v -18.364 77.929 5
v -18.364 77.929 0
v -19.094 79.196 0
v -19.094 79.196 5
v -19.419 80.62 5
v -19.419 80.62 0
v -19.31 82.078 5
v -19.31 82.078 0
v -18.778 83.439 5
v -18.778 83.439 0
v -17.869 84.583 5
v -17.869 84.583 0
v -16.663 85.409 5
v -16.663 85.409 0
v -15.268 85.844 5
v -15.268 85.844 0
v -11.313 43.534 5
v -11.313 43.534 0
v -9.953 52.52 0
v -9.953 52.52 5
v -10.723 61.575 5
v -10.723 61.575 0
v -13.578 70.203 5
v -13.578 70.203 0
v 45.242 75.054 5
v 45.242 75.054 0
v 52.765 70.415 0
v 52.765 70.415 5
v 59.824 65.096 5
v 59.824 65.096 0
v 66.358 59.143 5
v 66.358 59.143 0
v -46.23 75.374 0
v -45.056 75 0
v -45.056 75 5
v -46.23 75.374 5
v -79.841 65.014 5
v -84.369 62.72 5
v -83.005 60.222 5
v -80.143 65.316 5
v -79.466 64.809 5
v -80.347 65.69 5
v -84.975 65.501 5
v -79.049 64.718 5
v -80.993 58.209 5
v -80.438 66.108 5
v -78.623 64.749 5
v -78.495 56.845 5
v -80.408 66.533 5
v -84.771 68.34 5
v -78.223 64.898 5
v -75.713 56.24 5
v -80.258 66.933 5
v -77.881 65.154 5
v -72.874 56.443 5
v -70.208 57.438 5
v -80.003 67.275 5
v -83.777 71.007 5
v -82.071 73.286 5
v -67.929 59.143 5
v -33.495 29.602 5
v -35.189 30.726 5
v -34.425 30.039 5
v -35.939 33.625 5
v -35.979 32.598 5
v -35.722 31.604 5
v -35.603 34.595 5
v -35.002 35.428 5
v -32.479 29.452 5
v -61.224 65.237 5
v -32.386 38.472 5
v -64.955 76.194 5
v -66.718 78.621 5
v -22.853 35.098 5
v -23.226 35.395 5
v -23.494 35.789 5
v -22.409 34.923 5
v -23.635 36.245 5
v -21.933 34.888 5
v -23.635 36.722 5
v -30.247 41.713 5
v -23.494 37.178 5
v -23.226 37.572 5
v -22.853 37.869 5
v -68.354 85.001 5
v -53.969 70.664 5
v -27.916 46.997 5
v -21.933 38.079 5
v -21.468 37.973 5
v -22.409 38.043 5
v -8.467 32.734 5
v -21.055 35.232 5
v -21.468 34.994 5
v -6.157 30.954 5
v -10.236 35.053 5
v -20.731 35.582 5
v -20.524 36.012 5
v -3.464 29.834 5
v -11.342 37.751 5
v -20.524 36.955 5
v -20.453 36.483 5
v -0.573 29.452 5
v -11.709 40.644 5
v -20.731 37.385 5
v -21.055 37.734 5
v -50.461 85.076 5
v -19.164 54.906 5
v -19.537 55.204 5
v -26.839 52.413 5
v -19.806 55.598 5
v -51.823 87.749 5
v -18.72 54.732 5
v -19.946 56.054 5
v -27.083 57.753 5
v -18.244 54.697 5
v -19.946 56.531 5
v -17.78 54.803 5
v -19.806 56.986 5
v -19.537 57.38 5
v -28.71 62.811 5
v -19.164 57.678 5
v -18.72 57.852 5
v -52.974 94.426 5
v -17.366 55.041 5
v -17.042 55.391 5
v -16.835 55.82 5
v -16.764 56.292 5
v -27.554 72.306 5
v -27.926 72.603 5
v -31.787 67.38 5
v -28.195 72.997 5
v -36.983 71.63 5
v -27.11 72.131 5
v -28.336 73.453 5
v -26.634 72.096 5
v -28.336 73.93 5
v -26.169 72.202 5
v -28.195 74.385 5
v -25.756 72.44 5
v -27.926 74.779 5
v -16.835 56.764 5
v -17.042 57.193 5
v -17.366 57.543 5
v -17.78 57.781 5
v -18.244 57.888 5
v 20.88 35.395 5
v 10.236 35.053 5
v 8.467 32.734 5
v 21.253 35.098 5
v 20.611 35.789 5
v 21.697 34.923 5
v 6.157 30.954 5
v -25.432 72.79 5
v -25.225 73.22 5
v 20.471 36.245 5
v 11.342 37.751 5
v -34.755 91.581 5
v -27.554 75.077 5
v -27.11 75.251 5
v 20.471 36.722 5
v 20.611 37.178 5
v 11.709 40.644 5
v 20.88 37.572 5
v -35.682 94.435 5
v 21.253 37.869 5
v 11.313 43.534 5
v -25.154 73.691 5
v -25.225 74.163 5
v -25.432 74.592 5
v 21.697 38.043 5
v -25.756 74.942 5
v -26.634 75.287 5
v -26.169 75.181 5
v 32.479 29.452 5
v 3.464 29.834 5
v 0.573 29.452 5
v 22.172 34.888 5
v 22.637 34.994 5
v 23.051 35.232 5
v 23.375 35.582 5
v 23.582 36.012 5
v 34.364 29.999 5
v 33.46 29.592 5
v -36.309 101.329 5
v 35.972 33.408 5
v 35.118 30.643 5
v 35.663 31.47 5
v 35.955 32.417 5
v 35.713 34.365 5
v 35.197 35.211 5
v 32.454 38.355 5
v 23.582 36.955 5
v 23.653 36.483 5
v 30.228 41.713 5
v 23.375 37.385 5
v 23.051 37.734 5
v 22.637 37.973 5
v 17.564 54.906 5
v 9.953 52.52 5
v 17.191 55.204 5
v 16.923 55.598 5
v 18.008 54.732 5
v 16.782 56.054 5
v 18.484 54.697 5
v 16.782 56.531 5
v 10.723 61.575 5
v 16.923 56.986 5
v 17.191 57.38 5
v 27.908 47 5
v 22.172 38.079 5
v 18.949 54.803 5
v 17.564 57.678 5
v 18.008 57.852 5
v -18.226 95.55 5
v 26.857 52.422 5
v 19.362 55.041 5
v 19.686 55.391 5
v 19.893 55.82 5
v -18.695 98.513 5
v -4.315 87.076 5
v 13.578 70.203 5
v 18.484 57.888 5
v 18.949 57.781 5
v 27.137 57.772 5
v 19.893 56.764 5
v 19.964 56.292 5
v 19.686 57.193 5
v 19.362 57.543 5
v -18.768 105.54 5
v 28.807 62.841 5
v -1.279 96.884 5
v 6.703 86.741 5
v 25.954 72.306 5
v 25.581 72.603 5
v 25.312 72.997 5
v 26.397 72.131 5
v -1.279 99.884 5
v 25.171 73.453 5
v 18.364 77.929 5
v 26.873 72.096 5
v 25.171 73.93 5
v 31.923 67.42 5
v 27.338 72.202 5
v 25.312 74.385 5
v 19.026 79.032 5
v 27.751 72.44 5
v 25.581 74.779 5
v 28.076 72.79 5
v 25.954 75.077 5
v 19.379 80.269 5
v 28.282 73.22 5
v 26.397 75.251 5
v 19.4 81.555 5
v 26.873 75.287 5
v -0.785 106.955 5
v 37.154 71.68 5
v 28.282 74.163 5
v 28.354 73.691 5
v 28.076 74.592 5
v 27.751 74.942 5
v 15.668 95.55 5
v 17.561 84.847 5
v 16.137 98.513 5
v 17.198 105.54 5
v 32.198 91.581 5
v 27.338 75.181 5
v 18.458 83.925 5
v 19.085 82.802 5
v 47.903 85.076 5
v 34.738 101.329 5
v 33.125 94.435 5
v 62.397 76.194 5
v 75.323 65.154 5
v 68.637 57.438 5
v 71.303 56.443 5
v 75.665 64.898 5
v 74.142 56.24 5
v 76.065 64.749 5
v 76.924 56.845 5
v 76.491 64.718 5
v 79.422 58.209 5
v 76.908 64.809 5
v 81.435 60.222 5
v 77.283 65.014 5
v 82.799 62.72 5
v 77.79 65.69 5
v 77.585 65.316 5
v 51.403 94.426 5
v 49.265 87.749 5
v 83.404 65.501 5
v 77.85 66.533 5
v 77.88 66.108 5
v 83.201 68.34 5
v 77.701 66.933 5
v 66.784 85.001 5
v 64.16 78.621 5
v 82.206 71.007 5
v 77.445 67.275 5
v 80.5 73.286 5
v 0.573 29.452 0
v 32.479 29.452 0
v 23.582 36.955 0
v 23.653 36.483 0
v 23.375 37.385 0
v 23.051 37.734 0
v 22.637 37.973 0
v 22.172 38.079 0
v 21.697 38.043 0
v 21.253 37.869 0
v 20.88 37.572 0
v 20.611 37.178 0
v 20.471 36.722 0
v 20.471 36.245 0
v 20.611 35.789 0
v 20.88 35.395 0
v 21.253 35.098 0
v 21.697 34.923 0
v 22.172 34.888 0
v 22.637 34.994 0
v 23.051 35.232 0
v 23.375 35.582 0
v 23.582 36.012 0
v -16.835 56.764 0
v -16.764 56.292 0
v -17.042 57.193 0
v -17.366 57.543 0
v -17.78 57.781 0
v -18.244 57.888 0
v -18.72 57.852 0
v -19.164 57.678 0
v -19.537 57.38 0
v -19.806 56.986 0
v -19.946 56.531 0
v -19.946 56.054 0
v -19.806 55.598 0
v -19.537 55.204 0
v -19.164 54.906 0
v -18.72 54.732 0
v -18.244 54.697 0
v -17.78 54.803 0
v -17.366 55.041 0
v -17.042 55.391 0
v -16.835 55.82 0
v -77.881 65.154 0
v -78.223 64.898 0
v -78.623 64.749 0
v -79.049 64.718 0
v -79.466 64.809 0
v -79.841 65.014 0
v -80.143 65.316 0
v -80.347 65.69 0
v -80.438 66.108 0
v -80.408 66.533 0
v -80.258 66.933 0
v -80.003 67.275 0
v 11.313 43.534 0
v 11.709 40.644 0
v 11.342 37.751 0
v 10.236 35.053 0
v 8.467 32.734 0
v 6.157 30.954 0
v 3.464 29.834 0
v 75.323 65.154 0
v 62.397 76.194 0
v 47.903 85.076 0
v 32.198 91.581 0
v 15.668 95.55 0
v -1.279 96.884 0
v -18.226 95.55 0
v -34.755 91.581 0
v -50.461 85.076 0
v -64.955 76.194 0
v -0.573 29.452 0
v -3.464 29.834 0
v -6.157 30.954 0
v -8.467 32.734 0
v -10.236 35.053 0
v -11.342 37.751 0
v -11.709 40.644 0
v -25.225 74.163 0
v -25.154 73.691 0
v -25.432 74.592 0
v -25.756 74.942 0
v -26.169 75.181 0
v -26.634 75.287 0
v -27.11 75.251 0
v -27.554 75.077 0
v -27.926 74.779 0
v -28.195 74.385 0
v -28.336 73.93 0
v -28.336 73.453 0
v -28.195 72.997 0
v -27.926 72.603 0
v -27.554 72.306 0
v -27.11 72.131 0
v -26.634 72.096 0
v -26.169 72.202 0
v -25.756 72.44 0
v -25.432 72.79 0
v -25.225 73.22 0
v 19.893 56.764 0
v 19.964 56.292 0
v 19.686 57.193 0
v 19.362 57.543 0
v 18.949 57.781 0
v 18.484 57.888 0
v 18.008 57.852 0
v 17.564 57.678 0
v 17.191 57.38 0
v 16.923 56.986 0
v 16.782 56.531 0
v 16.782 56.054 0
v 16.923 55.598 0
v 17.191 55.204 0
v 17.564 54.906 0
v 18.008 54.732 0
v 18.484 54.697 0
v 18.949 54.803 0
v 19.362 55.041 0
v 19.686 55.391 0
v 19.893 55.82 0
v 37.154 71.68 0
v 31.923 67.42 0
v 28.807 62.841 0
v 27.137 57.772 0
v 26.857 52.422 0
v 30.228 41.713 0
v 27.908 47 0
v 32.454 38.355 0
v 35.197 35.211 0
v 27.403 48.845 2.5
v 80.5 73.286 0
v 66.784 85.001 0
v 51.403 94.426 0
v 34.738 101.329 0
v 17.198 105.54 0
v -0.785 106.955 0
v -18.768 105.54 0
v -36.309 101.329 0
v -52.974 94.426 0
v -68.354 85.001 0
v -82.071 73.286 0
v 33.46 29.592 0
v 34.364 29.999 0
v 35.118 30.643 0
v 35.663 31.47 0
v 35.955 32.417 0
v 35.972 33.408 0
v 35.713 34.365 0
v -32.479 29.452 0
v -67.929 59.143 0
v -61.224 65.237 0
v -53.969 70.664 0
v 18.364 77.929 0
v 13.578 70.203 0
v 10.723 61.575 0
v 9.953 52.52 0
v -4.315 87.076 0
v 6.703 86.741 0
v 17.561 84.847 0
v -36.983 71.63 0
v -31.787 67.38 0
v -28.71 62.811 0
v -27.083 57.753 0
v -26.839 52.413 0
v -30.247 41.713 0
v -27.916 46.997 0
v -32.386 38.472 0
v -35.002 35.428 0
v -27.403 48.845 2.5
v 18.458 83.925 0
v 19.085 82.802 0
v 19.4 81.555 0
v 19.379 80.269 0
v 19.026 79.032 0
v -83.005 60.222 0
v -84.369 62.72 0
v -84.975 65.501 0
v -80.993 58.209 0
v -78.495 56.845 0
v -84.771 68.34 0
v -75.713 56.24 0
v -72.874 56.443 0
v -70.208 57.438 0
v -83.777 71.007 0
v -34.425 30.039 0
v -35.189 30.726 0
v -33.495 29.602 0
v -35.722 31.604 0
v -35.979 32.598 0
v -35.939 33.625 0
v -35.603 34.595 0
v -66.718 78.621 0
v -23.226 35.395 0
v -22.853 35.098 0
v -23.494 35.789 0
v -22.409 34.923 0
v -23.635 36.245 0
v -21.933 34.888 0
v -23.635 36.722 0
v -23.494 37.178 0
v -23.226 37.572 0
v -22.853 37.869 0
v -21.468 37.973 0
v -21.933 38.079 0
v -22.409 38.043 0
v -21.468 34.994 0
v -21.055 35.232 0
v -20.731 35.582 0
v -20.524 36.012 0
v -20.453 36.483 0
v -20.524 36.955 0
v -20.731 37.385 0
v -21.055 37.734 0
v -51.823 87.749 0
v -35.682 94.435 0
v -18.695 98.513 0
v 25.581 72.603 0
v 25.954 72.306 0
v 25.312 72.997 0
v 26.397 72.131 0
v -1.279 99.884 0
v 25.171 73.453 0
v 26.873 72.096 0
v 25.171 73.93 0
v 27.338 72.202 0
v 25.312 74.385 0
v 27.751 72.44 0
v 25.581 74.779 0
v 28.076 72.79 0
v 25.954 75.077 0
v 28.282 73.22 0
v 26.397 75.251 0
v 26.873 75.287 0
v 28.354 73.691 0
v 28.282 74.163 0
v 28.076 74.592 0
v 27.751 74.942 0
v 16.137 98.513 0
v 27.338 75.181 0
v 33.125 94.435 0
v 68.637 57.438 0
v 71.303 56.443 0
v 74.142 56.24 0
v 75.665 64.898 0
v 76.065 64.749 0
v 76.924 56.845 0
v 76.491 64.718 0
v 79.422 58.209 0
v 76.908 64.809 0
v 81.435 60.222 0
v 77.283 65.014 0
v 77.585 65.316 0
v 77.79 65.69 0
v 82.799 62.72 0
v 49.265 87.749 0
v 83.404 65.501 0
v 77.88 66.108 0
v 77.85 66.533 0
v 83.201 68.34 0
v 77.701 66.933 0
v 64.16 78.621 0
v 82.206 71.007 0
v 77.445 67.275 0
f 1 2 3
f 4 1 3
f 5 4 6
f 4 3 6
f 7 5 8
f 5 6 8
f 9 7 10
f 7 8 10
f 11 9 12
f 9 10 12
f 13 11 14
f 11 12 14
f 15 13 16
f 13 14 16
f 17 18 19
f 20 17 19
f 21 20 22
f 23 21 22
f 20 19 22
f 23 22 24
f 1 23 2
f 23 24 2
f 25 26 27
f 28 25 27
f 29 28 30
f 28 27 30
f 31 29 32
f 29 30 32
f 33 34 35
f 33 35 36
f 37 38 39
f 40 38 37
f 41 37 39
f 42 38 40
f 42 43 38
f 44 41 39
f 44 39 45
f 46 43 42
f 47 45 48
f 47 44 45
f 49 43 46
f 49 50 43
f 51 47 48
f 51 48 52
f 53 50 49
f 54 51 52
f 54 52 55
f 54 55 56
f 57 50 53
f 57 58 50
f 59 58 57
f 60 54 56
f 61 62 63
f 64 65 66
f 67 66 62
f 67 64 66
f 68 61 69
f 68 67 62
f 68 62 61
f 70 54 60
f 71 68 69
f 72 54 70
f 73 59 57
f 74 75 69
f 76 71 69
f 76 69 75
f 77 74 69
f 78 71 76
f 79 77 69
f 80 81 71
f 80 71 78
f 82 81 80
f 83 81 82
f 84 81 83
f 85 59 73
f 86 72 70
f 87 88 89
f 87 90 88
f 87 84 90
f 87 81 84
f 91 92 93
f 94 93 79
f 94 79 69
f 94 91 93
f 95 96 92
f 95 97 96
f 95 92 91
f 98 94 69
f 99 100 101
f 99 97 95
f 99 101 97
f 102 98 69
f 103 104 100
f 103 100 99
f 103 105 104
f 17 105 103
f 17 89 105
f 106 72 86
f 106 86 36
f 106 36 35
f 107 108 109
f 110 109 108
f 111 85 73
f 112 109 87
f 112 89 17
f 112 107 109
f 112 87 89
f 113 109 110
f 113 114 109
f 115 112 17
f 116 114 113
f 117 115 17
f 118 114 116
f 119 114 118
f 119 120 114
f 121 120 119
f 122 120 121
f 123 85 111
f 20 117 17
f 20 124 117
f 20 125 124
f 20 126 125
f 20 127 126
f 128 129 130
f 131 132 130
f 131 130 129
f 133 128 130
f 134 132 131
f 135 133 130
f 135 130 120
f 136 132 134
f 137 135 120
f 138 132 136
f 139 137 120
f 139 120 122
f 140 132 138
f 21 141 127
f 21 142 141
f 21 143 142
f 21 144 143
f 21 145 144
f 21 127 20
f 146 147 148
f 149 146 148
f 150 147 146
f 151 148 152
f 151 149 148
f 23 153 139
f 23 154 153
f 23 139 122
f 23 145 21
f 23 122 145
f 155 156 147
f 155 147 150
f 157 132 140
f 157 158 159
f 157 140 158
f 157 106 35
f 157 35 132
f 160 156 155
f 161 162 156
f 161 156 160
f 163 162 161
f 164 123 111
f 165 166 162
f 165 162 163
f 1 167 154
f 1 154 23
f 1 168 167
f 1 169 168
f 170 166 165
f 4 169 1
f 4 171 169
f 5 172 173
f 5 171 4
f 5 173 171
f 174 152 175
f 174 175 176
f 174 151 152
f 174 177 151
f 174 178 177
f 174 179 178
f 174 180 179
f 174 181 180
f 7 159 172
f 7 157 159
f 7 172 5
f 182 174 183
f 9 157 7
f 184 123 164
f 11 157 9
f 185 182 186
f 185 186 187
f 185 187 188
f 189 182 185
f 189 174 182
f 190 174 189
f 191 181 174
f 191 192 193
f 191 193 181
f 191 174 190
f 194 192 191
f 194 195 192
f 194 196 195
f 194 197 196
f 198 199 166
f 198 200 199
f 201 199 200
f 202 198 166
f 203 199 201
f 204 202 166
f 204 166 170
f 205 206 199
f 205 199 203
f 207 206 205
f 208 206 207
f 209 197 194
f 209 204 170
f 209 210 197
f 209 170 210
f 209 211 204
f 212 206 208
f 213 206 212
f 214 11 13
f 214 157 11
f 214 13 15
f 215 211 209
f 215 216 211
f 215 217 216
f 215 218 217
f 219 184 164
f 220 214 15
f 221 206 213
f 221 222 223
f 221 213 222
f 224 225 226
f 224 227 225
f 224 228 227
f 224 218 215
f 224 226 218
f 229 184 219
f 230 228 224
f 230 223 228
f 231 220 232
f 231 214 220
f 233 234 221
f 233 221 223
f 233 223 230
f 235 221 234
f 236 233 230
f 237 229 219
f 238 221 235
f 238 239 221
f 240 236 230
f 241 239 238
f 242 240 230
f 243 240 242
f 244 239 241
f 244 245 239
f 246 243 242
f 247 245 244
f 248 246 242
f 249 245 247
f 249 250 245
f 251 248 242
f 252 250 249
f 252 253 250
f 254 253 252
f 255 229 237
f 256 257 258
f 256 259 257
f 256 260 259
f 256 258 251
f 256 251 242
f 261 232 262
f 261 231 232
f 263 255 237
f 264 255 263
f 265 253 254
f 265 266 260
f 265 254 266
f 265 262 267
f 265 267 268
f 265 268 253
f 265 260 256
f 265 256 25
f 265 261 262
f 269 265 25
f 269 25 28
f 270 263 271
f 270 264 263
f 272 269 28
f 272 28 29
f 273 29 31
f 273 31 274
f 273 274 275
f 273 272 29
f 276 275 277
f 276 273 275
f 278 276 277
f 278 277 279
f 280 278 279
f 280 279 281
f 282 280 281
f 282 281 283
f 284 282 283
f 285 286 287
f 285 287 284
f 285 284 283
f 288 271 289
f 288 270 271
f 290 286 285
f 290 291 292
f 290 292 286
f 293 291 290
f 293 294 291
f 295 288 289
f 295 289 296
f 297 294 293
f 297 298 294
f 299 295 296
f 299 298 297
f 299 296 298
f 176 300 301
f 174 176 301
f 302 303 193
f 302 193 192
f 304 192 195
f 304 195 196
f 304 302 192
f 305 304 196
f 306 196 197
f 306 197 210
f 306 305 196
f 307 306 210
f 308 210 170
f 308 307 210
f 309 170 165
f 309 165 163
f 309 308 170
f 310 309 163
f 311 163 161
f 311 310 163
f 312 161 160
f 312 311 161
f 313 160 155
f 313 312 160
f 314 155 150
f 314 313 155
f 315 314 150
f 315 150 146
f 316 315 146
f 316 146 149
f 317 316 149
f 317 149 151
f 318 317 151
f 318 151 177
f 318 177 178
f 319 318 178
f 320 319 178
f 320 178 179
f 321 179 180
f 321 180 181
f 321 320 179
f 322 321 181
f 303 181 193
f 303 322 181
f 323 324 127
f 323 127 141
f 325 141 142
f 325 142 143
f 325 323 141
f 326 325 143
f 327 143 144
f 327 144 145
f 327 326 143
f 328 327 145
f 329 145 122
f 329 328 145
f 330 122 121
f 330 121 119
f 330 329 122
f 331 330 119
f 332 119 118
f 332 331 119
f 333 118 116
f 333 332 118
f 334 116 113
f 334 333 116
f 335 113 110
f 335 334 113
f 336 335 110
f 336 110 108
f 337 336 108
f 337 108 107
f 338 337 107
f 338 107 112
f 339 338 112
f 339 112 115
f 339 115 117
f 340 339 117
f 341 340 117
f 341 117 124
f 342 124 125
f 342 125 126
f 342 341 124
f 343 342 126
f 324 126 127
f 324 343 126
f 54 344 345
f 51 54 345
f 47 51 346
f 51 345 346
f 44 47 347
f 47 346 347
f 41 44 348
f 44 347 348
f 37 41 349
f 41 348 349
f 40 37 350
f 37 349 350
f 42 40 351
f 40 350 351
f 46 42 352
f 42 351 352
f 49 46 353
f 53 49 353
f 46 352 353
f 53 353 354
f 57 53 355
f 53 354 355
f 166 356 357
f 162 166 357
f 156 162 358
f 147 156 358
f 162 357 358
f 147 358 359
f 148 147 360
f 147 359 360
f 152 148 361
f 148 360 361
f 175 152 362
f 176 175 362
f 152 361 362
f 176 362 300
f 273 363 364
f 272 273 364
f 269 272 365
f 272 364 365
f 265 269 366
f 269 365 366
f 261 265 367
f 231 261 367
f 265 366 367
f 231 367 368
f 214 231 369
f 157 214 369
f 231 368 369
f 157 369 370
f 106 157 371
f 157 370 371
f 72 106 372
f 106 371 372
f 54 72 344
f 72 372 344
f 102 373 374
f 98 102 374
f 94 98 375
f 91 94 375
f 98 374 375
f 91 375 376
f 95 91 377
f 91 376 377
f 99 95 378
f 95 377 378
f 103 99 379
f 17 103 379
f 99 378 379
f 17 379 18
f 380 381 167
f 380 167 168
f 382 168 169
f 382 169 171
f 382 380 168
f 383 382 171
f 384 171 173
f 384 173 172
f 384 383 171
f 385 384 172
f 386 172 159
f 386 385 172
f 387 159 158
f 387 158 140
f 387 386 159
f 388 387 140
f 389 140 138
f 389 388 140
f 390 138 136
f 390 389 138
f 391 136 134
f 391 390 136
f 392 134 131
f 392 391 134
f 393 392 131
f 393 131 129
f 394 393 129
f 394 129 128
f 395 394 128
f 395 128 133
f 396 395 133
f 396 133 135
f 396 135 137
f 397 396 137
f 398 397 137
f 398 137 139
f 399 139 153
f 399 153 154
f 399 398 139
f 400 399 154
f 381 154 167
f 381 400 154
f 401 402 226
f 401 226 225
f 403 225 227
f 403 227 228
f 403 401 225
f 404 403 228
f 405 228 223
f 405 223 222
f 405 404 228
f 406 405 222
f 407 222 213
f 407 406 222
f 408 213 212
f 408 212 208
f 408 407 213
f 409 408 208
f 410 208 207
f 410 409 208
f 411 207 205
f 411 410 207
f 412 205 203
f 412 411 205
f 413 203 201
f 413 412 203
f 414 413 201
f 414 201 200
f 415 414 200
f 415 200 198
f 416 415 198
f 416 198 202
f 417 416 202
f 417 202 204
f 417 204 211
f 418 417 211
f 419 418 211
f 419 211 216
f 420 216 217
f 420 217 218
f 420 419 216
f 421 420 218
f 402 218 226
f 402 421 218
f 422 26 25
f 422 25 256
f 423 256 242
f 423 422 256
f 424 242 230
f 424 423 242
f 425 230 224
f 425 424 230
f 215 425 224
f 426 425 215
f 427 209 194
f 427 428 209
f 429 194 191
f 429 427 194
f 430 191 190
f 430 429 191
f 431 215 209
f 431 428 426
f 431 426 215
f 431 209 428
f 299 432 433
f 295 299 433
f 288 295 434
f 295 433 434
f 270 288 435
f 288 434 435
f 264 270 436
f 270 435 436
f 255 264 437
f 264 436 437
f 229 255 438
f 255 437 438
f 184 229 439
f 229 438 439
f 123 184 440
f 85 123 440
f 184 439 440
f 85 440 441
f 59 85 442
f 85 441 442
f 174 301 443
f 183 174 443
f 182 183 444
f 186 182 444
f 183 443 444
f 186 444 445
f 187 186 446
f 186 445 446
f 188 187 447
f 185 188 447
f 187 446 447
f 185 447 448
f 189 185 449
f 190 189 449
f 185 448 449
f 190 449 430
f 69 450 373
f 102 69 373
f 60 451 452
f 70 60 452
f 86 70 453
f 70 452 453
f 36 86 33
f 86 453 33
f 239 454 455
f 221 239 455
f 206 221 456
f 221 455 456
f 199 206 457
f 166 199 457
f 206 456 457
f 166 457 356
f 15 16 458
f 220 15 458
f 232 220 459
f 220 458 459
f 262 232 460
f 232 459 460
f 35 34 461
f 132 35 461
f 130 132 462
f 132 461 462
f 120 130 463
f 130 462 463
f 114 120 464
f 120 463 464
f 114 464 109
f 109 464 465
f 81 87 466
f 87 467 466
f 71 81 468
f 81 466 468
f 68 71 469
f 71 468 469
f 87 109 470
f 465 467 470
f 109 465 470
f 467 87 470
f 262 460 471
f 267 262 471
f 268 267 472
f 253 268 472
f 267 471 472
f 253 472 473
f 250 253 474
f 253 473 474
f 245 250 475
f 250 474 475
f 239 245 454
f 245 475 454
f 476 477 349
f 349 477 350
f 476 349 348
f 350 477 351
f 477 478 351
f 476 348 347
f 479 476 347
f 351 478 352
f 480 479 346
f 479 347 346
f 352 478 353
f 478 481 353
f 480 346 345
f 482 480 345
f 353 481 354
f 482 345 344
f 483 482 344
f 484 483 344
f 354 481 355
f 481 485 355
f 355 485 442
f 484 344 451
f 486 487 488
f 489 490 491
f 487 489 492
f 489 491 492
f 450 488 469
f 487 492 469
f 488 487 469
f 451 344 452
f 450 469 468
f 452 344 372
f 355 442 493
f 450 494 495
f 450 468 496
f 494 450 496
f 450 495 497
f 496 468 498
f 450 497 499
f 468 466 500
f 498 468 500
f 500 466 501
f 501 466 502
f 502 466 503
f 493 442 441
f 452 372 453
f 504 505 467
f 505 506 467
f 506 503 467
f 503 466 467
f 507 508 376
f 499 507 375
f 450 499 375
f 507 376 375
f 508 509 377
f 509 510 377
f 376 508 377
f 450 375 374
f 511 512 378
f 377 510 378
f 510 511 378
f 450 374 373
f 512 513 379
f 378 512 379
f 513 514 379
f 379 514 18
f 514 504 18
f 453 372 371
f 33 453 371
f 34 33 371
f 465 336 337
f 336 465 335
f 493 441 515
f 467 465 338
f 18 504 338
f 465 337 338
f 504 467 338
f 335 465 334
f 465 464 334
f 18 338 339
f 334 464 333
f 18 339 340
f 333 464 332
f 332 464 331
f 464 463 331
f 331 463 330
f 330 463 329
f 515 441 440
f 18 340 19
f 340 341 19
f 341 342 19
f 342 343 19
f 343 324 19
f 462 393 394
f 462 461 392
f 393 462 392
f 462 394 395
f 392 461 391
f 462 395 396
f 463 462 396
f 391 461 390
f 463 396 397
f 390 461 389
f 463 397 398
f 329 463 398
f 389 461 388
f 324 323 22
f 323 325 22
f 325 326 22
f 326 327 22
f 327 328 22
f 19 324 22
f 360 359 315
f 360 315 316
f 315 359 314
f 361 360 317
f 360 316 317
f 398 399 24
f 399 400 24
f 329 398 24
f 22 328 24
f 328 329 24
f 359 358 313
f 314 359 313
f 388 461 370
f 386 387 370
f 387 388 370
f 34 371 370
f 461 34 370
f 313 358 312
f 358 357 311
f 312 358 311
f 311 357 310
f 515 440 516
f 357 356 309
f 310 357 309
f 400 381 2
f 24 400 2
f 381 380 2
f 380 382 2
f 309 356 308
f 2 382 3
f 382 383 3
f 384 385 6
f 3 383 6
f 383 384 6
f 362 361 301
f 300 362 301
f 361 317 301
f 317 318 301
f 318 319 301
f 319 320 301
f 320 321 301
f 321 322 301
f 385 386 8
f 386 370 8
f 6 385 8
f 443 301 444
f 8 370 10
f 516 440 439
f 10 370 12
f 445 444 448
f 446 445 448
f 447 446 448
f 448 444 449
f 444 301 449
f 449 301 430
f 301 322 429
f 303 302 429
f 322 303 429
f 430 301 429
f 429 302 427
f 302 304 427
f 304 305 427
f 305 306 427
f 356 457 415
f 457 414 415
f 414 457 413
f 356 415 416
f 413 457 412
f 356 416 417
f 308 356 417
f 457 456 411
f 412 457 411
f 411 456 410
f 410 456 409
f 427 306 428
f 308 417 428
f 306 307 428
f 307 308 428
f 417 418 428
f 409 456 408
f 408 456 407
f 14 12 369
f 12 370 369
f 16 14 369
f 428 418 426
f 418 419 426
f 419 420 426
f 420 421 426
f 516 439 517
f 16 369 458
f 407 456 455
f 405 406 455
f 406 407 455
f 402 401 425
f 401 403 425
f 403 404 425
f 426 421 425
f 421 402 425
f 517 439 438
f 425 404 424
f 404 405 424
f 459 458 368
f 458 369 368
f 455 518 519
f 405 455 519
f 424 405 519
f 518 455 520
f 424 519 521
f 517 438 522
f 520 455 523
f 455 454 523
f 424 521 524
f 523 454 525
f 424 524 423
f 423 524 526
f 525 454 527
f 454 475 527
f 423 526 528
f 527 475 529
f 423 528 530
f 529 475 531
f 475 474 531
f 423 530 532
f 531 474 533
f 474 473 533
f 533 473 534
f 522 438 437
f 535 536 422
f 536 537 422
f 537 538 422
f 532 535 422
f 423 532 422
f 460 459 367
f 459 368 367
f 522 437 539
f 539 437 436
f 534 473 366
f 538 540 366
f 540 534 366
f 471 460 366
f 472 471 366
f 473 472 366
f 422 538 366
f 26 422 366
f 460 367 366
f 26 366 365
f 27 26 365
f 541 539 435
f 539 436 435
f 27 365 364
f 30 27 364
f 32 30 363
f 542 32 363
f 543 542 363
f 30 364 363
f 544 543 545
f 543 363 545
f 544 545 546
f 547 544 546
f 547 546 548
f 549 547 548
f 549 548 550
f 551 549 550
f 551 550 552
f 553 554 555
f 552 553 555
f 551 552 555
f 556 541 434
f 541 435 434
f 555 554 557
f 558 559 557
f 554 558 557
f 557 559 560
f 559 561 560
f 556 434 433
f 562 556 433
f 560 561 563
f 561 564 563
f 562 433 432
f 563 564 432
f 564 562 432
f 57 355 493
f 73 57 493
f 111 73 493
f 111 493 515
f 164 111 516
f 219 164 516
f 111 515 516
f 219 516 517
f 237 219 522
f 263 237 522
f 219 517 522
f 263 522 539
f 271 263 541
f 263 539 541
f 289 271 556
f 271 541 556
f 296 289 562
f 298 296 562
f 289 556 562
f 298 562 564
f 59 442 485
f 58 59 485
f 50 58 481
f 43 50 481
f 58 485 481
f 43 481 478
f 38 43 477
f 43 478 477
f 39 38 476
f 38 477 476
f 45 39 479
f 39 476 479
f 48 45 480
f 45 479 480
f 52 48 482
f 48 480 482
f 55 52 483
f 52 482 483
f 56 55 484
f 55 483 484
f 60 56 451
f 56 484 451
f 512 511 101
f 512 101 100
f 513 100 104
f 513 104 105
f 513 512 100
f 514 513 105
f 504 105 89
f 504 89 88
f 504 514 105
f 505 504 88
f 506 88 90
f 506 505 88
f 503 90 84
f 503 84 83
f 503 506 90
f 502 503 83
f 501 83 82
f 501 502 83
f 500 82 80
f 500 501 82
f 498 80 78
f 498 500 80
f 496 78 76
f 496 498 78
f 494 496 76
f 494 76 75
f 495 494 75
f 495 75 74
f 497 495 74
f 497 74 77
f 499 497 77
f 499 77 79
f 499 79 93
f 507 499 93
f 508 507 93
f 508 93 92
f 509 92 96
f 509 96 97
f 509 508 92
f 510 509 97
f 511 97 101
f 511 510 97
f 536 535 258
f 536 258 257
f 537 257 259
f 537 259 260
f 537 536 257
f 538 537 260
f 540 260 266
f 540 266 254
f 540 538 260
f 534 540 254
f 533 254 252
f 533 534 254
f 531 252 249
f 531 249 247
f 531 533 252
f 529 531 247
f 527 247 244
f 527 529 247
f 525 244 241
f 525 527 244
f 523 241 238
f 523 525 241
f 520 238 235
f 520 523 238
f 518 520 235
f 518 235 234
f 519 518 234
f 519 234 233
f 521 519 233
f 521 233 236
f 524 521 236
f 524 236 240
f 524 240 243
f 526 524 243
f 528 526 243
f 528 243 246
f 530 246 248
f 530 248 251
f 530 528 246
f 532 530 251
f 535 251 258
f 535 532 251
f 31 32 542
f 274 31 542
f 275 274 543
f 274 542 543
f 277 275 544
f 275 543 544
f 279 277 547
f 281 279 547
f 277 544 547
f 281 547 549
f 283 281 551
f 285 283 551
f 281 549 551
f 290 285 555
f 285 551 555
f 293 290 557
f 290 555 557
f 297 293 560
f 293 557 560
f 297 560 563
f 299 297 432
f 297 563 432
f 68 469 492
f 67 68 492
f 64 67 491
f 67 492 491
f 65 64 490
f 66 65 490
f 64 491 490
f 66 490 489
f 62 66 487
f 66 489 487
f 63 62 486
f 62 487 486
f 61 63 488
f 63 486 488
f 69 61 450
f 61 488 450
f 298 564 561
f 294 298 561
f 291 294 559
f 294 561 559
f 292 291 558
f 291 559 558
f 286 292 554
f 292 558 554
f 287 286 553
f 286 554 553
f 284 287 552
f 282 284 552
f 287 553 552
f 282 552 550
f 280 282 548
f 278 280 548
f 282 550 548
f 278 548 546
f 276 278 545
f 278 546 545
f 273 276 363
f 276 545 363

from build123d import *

# Parameters (mm, degrees)
SKETCH1_R           = 1.6
BOSS_EXTRUDE1_DEPTH = 5


with BuildPart() as part:
    # Sketch1 → Boss-Extrude1 (new body)
    with BuildSketch(Plane.XY):
        with BuildLine():
            Line((-24.374481213, 29.452498133), (-0.573242194, 29.452498133))
            ThreePointArc((-0.573242194, 29.452498133), (-9.427933785, 33.83519482), (-11.31305575, 43.533643593))
            ThreePointArc((-11.31305575, 43.533643593), (-10.722602644, 61.575298771), (-18.364057527, 77.929445758))
            ThreePointArc((-18.364057527, 77.929445758), (-19.094832363, 82.778042962), (-15.26841437, 85.8442217))
            ThreePointArc((-15.26841437, 85.8442217), (1.199883283, 87.104187108), (17.561282991, 84.846546742))
            ThreePointArc((17.561282991, 84.846546742), (19.39962033, 81.554763647), (18.364057527, 77.929445758))
            ThreePointArc((18.364057527, 77.929445758), (10.722602644, 61.575298771), (11.31305575, 43.533643593))
            ThreePointArc((11.31305575, 43.533643593), (9.427933785, 33.83519482), (0.573242194, 29.452498133))
            Line((0.573242194, 29.452498133), (24.374481213, 29.452498133))
            Line((24.374481213, 29.452498133), (32.479003365, 29.452498133))
            ThreePointArc((32.479003365, 29.452498133), (35.662704371, 31.470373288), (35.196724718, 35.210779041))
            add(Edge.make_bspline(
                [(45.242051564, 75.05397765), (30.132062398, 70.946476879), (22.540088549, 54.680703196), (31.199508073, 39.237934138), (35.196724718, 35.210779041)],
                knots=[0.154808761, 0.154808761, 0.154808761, 0.154808761, 0.468621415, 0.608629265, 0.608629265, 0.608629265, 0.608629265], degree=3))
            ThreePointArc((45.242051564, 75.05397765), (56.35651155, 67.837262053), (66.358030541, 59.143481365))
            ThreePointArc((66.358030541, 59.143481365), (80.500166165, 59.143481365), (80.500166165, 73.285616989))
            ThreePointArc((80.500166165, 73.285616989), (-0.785450823, 106.955221971), (-82.071067812, 73.285616989))
            ThreePointArc((-82.071067812, 73.285616989), (-82.071067758, 59.143481311), (-67.928932081, 59.143481472))
            ThreePointArc((-67.928932081, 59.143481472), (-57.661393829, 68.036973299), (-46.22992721, 75.374419011))
            add(Edge.make_bspline(
                [(-45.055737448, 75), (-46.22992721, 75.374419011)],
                knots=[0, 0, 1, 1], degree=1))
            add(Edge.make_bspline(
                [(-45.055737448, 75), (-29.945748281, 70.892499229), (-22.599492553, 54.774229637), (-31.125849983, 39.411271255), (-35.001982205, 35.428245813)],
                knots=[0.154808761, 0.154808761, 0.154808761, 0.154808761, 0.468621415, 0.60616707, 0.60616707, 0.60616707, 0.60616707], degree=3))
            ThreePointArc((-35.001982205, 35.428245813), (-35.72226494, 31.603661743), (-32.479003365, 29.452498133))
            Line((-32.479003365, 29.452498133), (-24.374481213, 29.452498133))
        make_face()
        with Locations((-22.052924911, 36.483296004)):
            Circle(SKETCH1_R, mode=Mode.SUBTRACT)
        with Locations((-18.364057527, 56.292076909)):
            Circle(SKETCH1_R, mode=Mode.SUBTRACT)
        with Locations((22.052924912, 36.483296004)):
            Circle(SKETCH1_R, mode=Mode.SUBTRACT)
        with Locations((18.364057527, 56.292076909)):
            Circle(SKETCH1_R, mode=Mode.SUBTRACT)
        with Locations((-26.753522246, 73.691170186)):
            Circle(SKETCH1_R, mode=Mode.SUBTRACT)
        with BuildLine():
            ThreePointArc((-80.002588236, 67.275209348), (-1.278913793, 99.883622983), (77.44476065, 67.275209348))
            ThreePointArc((77.44476065, 67.275209348), (77.44476065, 65.153889005), (75.323440307, 65.153889005))
            ThreePointArc((75.323440307, 65.153889005), (-1.278913793, 96.883622983), (-77.881267893, 65.153889005))
            ThreePointArc((-77.881267893, 65.153889005), (-80.002588236, 65.153889005), (-80.002588236, 67.275209348))
        make_face(mode=Mode.SUBTRACT)
        with Locations((26.753522246, 73.691170186)):
            Circle(SKETCH1_R, mode=Mode.SUBTRACT)
    extrude(amount=BOSS_EXTRUDE1_DEPTH)


solid = part.part
